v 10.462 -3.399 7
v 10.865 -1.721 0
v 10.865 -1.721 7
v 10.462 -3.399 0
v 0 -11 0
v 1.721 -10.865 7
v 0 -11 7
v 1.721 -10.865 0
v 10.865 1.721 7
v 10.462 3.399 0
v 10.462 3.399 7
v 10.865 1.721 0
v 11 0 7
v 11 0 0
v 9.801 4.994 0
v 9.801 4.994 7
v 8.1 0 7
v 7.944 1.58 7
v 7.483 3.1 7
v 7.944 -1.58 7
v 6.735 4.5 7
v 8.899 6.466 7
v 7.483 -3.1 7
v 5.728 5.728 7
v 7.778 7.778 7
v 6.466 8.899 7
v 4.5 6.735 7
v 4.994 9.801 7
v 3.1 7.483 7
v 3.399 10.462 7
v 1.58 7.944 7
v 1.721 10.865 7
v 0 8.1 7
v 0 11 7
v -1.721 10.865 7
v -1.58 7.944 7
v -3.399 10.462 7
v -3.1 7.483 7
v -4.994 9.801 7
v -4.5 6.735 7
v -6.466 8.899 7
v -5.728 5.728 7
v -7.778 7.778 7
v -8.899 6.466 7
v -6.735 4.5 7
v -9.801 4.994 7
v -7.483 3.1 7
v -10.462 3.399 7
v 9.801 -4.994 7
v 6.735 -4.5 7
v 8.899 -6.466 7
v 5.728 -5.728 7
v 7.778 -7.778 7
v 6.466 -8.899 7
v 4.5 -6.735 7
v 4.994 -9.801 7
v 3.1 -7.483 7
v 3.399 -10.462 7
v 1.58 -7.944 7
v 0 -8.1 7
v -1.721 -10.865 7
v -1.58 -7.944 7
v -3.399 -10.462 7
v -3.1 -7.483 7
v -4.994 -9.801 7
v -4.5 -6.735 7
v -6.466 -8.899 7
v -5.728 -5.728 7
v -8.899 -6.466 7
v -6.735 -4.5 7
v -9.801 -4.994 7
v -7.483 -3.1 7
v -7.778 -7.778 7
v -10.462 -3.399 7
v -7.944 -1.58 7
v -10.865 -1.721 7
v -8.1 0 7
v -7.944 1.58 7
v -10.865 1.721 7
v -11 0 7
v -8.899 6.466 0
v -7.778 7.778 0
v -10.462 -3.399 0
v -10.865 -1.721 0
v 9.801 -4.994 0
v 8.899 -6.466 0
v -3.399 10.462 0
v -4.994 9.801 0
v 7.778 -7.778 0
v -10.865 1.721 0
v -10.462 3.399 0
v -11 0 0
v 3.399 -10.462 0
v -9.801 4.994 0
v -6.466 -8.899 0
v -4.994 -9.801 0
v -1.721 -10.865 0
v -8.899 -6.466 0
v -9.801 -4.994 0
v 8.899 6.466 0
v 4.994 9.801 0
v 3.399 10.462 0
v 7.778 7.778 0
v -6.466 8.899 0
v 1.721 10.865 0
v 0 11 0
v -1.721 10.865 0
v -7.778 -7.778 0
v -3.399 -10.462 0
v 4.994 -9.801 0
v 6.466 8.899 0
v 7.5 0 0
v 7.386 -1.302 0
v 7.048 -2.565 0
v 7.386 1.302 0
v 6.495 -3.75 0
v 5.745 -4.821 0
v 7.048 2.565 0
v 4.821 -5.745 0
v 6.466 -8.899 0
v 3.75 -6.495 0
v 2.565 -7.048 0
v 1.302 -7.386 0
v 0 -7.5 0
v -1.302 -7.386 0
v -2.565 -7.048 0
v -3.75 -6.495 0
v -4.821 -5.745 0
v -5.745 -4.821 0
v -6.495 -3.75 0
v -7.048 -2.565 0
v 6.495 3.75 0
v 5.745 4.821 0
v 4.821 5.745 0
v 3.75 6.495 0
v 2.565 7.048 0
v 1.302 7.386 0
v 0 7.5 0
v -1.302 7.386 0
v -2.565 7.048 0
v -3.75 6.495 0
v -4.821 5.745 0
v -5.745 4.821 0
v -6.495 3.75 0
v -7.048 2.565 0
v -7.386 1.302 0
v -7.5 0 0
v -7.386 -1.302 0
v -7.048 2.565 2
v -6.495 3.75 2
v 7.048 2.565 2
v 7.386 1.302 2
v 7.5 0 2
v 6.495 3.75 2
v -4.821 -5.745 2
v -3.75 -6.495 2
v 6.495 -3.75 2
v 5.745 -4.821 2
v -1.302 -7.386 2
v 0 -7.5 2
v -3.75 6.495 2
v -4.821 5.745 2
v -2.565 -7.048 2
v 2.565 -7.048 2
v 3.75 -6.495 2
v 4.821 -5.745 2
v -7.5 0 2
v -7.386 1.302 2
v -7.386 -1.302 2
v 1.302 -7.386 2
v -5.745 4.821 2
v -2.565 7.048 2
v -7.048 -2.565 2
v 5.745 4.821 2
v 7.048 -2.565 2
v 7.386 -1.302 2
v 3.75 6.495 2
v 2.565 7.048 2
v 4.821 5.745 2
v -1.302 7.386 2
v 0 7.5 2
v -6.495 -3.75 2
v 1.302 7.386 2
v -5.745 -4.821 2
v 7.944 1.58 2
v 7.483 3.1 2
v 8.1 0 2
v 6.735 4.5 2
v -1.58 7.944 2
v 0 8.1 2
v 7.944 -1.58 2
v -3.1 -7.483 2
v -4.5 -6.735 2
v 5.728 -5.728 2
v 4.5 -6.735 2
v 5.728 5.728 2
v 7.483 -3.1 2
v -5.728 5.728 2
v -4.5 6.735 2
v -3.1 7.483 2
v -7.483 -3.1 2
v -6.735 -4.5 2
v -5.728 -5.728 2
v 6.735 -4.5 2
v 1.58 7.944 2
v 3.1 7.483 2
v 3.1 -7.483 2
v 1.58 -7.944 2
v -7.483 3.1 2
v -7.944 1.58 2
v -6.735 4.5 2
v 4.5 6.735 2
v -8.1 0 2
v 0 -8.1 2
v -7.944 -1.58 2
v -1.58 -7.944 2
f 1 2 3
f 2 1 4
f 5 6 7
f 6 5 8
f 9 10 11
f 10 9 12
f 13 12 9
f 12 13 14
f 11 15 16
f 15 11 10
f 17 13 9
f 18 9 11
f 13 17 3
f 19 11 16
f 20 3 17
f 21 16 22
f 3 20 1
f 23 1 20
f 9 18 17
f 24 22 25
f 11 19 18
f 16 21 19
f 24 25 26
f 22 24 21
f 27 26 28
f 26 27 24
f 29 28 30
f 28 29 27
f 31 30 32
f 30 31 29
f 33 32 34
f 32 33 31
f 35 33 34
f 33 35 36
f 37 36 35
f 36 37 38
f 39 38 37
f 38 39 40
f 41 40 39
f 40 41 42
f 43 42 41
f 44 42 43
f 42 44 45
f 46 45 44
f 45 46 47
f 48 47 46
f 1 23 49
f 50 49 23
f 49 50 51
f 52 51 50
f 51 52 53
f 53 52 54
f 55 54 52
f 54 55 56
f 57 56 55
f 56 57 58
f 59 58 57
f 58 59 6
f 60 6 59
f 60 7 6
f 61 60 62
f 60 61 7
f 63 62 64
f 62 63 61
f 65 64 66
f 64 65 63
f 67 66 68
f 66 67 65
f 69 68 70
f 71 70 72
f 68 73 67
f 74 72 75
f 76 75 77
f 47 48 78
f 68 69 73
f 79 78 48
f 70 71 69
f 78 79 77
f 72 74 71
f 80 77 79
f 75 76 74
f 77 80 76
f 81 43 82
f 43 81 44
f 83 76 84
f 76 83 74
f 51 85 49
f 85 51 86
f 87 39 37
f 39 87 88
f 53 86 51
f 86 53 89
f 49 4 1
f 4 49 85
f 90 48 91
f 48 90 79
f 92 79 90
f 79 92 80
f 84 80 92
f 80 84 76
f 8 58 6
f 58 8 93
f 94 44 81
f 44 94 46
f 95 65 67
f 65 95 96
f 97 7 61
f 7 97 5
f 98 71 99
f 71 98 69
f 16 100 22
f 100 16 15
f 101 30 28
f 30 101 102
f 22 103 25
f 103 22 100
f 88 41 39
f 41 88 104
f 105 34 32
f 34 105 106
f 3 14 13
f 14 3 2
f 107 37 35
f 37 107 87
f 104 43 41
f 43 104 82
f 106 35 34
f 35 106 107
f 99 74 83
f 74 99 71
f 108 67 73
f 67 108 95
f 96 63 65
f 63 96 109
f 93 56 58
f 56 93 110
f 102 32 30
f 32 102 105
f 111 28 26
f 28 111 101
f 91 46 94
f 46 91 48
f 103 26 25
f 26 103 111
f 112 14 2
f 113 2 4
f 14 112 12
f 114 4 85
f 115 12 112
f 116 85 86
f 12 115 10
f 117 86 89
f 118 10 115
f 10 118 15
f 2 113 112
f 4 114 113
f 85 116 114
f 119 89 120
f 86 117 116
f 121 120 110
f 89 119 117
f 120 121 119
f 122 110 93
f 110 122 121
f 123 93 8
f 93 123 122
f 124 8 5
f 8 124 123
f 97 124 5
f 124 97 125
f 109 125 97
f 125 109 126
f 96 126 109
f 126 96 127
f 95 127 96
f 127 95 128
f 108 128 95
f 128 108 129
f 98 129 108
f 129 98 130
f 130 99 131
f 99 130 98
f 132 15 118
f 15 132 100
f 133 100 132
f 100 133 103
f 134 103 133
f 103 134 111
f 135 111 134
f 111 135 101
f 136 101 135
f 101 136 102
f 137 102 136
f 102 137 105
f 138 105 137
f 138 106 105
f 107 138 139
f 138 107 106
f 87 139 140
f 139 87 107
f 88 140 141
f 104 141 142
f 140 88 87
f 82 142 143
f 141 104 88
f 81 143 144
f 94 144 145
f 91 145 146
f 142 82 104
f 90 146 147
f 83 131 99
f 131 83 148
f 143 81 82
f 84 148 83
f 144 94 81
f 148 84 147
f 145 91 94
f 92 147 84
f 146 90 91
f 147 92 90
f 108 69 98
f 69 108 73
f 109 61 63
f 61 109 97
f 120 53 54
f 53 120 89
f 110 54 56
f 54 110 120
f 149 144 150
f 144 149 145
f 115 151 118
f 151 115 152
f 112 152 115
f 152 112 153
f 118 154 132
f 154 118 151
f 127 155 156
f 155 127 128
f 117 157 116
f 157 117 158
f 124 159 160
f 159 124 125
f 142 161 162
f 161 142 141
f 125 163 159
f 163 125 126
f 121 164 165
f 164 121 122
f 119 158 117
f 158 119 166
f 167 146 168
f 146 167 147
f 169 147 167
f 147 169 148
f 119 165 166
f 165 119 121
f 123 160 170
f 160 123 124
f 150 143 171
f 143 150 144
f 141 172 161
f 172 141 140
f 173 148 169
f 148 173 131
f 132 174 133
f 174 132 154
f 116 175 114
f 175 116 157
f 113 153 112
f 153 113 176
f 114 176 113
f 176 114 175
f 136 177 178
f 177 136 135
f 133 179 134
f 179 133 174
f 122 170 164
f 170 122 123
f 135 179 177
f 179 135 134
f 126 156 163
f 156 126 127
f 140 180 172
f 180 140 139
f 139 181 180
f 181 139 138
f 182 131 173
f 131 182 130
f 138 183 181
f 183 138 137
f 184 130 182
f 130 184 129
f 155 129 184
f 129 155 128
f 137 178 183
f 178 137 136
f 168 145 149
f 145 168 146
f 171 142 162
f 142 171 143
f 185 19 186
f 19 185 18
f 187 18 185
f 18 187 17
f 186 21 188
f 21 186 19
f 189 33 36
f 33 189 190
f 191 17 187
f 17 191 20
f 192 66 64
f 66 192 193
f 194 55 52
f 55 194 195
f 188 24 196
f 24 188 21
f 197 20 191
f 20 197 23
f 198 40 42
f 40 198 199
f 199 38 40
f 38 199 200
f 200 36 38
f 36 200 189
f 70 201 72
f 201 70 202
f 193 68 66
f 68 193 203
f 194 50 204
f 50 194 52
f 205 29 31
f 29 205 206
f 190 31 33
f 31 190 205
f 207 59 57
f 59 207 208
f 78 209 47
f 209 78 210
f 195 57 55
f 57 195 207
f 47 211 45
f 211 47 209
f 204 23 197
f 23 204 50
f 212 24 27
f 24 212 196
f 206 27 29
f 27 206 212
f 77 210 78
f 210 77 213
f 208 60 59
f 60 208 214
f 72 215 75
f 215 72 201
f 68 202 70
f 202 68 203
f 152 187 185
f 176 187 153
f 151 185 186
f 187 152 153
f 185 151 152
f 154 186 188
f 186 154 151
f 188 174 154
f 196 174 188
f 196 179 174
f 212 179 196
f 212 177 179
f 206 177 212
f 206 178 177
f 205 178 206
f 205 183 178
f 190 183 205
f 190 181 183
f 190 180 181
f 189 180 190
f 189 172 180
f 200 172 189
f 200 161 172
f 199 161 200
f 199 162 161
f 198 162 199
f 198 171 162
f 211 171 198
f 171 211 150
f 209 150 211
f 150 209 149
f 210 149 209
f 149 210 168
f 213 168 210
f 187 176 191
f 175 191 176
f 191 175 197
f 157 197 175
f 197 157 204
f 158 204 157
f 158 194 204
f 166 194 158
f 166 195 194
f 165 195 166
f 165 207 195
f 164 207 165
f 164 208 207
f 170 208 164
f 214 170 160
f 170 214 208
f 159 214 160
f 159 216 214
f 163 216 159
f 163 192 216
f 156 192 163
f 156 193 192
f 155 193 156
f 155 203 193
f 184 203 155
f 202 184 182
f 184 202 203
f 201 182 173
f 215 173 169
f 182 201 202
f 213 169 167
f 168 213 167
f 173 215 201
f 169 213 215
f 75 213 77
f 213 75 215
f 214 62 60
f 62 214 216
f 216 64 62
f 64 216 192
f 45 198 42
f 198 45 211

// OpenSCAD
difference(){
  cylinder(d=22,h=7,$fn=40);
  translate([0,0,-.01]) cylinder(d=15,h=7.02,$fn=36);
  translate([0,0,2]) cylinder(d=16.2,h=5.01,$fn=32);
}
